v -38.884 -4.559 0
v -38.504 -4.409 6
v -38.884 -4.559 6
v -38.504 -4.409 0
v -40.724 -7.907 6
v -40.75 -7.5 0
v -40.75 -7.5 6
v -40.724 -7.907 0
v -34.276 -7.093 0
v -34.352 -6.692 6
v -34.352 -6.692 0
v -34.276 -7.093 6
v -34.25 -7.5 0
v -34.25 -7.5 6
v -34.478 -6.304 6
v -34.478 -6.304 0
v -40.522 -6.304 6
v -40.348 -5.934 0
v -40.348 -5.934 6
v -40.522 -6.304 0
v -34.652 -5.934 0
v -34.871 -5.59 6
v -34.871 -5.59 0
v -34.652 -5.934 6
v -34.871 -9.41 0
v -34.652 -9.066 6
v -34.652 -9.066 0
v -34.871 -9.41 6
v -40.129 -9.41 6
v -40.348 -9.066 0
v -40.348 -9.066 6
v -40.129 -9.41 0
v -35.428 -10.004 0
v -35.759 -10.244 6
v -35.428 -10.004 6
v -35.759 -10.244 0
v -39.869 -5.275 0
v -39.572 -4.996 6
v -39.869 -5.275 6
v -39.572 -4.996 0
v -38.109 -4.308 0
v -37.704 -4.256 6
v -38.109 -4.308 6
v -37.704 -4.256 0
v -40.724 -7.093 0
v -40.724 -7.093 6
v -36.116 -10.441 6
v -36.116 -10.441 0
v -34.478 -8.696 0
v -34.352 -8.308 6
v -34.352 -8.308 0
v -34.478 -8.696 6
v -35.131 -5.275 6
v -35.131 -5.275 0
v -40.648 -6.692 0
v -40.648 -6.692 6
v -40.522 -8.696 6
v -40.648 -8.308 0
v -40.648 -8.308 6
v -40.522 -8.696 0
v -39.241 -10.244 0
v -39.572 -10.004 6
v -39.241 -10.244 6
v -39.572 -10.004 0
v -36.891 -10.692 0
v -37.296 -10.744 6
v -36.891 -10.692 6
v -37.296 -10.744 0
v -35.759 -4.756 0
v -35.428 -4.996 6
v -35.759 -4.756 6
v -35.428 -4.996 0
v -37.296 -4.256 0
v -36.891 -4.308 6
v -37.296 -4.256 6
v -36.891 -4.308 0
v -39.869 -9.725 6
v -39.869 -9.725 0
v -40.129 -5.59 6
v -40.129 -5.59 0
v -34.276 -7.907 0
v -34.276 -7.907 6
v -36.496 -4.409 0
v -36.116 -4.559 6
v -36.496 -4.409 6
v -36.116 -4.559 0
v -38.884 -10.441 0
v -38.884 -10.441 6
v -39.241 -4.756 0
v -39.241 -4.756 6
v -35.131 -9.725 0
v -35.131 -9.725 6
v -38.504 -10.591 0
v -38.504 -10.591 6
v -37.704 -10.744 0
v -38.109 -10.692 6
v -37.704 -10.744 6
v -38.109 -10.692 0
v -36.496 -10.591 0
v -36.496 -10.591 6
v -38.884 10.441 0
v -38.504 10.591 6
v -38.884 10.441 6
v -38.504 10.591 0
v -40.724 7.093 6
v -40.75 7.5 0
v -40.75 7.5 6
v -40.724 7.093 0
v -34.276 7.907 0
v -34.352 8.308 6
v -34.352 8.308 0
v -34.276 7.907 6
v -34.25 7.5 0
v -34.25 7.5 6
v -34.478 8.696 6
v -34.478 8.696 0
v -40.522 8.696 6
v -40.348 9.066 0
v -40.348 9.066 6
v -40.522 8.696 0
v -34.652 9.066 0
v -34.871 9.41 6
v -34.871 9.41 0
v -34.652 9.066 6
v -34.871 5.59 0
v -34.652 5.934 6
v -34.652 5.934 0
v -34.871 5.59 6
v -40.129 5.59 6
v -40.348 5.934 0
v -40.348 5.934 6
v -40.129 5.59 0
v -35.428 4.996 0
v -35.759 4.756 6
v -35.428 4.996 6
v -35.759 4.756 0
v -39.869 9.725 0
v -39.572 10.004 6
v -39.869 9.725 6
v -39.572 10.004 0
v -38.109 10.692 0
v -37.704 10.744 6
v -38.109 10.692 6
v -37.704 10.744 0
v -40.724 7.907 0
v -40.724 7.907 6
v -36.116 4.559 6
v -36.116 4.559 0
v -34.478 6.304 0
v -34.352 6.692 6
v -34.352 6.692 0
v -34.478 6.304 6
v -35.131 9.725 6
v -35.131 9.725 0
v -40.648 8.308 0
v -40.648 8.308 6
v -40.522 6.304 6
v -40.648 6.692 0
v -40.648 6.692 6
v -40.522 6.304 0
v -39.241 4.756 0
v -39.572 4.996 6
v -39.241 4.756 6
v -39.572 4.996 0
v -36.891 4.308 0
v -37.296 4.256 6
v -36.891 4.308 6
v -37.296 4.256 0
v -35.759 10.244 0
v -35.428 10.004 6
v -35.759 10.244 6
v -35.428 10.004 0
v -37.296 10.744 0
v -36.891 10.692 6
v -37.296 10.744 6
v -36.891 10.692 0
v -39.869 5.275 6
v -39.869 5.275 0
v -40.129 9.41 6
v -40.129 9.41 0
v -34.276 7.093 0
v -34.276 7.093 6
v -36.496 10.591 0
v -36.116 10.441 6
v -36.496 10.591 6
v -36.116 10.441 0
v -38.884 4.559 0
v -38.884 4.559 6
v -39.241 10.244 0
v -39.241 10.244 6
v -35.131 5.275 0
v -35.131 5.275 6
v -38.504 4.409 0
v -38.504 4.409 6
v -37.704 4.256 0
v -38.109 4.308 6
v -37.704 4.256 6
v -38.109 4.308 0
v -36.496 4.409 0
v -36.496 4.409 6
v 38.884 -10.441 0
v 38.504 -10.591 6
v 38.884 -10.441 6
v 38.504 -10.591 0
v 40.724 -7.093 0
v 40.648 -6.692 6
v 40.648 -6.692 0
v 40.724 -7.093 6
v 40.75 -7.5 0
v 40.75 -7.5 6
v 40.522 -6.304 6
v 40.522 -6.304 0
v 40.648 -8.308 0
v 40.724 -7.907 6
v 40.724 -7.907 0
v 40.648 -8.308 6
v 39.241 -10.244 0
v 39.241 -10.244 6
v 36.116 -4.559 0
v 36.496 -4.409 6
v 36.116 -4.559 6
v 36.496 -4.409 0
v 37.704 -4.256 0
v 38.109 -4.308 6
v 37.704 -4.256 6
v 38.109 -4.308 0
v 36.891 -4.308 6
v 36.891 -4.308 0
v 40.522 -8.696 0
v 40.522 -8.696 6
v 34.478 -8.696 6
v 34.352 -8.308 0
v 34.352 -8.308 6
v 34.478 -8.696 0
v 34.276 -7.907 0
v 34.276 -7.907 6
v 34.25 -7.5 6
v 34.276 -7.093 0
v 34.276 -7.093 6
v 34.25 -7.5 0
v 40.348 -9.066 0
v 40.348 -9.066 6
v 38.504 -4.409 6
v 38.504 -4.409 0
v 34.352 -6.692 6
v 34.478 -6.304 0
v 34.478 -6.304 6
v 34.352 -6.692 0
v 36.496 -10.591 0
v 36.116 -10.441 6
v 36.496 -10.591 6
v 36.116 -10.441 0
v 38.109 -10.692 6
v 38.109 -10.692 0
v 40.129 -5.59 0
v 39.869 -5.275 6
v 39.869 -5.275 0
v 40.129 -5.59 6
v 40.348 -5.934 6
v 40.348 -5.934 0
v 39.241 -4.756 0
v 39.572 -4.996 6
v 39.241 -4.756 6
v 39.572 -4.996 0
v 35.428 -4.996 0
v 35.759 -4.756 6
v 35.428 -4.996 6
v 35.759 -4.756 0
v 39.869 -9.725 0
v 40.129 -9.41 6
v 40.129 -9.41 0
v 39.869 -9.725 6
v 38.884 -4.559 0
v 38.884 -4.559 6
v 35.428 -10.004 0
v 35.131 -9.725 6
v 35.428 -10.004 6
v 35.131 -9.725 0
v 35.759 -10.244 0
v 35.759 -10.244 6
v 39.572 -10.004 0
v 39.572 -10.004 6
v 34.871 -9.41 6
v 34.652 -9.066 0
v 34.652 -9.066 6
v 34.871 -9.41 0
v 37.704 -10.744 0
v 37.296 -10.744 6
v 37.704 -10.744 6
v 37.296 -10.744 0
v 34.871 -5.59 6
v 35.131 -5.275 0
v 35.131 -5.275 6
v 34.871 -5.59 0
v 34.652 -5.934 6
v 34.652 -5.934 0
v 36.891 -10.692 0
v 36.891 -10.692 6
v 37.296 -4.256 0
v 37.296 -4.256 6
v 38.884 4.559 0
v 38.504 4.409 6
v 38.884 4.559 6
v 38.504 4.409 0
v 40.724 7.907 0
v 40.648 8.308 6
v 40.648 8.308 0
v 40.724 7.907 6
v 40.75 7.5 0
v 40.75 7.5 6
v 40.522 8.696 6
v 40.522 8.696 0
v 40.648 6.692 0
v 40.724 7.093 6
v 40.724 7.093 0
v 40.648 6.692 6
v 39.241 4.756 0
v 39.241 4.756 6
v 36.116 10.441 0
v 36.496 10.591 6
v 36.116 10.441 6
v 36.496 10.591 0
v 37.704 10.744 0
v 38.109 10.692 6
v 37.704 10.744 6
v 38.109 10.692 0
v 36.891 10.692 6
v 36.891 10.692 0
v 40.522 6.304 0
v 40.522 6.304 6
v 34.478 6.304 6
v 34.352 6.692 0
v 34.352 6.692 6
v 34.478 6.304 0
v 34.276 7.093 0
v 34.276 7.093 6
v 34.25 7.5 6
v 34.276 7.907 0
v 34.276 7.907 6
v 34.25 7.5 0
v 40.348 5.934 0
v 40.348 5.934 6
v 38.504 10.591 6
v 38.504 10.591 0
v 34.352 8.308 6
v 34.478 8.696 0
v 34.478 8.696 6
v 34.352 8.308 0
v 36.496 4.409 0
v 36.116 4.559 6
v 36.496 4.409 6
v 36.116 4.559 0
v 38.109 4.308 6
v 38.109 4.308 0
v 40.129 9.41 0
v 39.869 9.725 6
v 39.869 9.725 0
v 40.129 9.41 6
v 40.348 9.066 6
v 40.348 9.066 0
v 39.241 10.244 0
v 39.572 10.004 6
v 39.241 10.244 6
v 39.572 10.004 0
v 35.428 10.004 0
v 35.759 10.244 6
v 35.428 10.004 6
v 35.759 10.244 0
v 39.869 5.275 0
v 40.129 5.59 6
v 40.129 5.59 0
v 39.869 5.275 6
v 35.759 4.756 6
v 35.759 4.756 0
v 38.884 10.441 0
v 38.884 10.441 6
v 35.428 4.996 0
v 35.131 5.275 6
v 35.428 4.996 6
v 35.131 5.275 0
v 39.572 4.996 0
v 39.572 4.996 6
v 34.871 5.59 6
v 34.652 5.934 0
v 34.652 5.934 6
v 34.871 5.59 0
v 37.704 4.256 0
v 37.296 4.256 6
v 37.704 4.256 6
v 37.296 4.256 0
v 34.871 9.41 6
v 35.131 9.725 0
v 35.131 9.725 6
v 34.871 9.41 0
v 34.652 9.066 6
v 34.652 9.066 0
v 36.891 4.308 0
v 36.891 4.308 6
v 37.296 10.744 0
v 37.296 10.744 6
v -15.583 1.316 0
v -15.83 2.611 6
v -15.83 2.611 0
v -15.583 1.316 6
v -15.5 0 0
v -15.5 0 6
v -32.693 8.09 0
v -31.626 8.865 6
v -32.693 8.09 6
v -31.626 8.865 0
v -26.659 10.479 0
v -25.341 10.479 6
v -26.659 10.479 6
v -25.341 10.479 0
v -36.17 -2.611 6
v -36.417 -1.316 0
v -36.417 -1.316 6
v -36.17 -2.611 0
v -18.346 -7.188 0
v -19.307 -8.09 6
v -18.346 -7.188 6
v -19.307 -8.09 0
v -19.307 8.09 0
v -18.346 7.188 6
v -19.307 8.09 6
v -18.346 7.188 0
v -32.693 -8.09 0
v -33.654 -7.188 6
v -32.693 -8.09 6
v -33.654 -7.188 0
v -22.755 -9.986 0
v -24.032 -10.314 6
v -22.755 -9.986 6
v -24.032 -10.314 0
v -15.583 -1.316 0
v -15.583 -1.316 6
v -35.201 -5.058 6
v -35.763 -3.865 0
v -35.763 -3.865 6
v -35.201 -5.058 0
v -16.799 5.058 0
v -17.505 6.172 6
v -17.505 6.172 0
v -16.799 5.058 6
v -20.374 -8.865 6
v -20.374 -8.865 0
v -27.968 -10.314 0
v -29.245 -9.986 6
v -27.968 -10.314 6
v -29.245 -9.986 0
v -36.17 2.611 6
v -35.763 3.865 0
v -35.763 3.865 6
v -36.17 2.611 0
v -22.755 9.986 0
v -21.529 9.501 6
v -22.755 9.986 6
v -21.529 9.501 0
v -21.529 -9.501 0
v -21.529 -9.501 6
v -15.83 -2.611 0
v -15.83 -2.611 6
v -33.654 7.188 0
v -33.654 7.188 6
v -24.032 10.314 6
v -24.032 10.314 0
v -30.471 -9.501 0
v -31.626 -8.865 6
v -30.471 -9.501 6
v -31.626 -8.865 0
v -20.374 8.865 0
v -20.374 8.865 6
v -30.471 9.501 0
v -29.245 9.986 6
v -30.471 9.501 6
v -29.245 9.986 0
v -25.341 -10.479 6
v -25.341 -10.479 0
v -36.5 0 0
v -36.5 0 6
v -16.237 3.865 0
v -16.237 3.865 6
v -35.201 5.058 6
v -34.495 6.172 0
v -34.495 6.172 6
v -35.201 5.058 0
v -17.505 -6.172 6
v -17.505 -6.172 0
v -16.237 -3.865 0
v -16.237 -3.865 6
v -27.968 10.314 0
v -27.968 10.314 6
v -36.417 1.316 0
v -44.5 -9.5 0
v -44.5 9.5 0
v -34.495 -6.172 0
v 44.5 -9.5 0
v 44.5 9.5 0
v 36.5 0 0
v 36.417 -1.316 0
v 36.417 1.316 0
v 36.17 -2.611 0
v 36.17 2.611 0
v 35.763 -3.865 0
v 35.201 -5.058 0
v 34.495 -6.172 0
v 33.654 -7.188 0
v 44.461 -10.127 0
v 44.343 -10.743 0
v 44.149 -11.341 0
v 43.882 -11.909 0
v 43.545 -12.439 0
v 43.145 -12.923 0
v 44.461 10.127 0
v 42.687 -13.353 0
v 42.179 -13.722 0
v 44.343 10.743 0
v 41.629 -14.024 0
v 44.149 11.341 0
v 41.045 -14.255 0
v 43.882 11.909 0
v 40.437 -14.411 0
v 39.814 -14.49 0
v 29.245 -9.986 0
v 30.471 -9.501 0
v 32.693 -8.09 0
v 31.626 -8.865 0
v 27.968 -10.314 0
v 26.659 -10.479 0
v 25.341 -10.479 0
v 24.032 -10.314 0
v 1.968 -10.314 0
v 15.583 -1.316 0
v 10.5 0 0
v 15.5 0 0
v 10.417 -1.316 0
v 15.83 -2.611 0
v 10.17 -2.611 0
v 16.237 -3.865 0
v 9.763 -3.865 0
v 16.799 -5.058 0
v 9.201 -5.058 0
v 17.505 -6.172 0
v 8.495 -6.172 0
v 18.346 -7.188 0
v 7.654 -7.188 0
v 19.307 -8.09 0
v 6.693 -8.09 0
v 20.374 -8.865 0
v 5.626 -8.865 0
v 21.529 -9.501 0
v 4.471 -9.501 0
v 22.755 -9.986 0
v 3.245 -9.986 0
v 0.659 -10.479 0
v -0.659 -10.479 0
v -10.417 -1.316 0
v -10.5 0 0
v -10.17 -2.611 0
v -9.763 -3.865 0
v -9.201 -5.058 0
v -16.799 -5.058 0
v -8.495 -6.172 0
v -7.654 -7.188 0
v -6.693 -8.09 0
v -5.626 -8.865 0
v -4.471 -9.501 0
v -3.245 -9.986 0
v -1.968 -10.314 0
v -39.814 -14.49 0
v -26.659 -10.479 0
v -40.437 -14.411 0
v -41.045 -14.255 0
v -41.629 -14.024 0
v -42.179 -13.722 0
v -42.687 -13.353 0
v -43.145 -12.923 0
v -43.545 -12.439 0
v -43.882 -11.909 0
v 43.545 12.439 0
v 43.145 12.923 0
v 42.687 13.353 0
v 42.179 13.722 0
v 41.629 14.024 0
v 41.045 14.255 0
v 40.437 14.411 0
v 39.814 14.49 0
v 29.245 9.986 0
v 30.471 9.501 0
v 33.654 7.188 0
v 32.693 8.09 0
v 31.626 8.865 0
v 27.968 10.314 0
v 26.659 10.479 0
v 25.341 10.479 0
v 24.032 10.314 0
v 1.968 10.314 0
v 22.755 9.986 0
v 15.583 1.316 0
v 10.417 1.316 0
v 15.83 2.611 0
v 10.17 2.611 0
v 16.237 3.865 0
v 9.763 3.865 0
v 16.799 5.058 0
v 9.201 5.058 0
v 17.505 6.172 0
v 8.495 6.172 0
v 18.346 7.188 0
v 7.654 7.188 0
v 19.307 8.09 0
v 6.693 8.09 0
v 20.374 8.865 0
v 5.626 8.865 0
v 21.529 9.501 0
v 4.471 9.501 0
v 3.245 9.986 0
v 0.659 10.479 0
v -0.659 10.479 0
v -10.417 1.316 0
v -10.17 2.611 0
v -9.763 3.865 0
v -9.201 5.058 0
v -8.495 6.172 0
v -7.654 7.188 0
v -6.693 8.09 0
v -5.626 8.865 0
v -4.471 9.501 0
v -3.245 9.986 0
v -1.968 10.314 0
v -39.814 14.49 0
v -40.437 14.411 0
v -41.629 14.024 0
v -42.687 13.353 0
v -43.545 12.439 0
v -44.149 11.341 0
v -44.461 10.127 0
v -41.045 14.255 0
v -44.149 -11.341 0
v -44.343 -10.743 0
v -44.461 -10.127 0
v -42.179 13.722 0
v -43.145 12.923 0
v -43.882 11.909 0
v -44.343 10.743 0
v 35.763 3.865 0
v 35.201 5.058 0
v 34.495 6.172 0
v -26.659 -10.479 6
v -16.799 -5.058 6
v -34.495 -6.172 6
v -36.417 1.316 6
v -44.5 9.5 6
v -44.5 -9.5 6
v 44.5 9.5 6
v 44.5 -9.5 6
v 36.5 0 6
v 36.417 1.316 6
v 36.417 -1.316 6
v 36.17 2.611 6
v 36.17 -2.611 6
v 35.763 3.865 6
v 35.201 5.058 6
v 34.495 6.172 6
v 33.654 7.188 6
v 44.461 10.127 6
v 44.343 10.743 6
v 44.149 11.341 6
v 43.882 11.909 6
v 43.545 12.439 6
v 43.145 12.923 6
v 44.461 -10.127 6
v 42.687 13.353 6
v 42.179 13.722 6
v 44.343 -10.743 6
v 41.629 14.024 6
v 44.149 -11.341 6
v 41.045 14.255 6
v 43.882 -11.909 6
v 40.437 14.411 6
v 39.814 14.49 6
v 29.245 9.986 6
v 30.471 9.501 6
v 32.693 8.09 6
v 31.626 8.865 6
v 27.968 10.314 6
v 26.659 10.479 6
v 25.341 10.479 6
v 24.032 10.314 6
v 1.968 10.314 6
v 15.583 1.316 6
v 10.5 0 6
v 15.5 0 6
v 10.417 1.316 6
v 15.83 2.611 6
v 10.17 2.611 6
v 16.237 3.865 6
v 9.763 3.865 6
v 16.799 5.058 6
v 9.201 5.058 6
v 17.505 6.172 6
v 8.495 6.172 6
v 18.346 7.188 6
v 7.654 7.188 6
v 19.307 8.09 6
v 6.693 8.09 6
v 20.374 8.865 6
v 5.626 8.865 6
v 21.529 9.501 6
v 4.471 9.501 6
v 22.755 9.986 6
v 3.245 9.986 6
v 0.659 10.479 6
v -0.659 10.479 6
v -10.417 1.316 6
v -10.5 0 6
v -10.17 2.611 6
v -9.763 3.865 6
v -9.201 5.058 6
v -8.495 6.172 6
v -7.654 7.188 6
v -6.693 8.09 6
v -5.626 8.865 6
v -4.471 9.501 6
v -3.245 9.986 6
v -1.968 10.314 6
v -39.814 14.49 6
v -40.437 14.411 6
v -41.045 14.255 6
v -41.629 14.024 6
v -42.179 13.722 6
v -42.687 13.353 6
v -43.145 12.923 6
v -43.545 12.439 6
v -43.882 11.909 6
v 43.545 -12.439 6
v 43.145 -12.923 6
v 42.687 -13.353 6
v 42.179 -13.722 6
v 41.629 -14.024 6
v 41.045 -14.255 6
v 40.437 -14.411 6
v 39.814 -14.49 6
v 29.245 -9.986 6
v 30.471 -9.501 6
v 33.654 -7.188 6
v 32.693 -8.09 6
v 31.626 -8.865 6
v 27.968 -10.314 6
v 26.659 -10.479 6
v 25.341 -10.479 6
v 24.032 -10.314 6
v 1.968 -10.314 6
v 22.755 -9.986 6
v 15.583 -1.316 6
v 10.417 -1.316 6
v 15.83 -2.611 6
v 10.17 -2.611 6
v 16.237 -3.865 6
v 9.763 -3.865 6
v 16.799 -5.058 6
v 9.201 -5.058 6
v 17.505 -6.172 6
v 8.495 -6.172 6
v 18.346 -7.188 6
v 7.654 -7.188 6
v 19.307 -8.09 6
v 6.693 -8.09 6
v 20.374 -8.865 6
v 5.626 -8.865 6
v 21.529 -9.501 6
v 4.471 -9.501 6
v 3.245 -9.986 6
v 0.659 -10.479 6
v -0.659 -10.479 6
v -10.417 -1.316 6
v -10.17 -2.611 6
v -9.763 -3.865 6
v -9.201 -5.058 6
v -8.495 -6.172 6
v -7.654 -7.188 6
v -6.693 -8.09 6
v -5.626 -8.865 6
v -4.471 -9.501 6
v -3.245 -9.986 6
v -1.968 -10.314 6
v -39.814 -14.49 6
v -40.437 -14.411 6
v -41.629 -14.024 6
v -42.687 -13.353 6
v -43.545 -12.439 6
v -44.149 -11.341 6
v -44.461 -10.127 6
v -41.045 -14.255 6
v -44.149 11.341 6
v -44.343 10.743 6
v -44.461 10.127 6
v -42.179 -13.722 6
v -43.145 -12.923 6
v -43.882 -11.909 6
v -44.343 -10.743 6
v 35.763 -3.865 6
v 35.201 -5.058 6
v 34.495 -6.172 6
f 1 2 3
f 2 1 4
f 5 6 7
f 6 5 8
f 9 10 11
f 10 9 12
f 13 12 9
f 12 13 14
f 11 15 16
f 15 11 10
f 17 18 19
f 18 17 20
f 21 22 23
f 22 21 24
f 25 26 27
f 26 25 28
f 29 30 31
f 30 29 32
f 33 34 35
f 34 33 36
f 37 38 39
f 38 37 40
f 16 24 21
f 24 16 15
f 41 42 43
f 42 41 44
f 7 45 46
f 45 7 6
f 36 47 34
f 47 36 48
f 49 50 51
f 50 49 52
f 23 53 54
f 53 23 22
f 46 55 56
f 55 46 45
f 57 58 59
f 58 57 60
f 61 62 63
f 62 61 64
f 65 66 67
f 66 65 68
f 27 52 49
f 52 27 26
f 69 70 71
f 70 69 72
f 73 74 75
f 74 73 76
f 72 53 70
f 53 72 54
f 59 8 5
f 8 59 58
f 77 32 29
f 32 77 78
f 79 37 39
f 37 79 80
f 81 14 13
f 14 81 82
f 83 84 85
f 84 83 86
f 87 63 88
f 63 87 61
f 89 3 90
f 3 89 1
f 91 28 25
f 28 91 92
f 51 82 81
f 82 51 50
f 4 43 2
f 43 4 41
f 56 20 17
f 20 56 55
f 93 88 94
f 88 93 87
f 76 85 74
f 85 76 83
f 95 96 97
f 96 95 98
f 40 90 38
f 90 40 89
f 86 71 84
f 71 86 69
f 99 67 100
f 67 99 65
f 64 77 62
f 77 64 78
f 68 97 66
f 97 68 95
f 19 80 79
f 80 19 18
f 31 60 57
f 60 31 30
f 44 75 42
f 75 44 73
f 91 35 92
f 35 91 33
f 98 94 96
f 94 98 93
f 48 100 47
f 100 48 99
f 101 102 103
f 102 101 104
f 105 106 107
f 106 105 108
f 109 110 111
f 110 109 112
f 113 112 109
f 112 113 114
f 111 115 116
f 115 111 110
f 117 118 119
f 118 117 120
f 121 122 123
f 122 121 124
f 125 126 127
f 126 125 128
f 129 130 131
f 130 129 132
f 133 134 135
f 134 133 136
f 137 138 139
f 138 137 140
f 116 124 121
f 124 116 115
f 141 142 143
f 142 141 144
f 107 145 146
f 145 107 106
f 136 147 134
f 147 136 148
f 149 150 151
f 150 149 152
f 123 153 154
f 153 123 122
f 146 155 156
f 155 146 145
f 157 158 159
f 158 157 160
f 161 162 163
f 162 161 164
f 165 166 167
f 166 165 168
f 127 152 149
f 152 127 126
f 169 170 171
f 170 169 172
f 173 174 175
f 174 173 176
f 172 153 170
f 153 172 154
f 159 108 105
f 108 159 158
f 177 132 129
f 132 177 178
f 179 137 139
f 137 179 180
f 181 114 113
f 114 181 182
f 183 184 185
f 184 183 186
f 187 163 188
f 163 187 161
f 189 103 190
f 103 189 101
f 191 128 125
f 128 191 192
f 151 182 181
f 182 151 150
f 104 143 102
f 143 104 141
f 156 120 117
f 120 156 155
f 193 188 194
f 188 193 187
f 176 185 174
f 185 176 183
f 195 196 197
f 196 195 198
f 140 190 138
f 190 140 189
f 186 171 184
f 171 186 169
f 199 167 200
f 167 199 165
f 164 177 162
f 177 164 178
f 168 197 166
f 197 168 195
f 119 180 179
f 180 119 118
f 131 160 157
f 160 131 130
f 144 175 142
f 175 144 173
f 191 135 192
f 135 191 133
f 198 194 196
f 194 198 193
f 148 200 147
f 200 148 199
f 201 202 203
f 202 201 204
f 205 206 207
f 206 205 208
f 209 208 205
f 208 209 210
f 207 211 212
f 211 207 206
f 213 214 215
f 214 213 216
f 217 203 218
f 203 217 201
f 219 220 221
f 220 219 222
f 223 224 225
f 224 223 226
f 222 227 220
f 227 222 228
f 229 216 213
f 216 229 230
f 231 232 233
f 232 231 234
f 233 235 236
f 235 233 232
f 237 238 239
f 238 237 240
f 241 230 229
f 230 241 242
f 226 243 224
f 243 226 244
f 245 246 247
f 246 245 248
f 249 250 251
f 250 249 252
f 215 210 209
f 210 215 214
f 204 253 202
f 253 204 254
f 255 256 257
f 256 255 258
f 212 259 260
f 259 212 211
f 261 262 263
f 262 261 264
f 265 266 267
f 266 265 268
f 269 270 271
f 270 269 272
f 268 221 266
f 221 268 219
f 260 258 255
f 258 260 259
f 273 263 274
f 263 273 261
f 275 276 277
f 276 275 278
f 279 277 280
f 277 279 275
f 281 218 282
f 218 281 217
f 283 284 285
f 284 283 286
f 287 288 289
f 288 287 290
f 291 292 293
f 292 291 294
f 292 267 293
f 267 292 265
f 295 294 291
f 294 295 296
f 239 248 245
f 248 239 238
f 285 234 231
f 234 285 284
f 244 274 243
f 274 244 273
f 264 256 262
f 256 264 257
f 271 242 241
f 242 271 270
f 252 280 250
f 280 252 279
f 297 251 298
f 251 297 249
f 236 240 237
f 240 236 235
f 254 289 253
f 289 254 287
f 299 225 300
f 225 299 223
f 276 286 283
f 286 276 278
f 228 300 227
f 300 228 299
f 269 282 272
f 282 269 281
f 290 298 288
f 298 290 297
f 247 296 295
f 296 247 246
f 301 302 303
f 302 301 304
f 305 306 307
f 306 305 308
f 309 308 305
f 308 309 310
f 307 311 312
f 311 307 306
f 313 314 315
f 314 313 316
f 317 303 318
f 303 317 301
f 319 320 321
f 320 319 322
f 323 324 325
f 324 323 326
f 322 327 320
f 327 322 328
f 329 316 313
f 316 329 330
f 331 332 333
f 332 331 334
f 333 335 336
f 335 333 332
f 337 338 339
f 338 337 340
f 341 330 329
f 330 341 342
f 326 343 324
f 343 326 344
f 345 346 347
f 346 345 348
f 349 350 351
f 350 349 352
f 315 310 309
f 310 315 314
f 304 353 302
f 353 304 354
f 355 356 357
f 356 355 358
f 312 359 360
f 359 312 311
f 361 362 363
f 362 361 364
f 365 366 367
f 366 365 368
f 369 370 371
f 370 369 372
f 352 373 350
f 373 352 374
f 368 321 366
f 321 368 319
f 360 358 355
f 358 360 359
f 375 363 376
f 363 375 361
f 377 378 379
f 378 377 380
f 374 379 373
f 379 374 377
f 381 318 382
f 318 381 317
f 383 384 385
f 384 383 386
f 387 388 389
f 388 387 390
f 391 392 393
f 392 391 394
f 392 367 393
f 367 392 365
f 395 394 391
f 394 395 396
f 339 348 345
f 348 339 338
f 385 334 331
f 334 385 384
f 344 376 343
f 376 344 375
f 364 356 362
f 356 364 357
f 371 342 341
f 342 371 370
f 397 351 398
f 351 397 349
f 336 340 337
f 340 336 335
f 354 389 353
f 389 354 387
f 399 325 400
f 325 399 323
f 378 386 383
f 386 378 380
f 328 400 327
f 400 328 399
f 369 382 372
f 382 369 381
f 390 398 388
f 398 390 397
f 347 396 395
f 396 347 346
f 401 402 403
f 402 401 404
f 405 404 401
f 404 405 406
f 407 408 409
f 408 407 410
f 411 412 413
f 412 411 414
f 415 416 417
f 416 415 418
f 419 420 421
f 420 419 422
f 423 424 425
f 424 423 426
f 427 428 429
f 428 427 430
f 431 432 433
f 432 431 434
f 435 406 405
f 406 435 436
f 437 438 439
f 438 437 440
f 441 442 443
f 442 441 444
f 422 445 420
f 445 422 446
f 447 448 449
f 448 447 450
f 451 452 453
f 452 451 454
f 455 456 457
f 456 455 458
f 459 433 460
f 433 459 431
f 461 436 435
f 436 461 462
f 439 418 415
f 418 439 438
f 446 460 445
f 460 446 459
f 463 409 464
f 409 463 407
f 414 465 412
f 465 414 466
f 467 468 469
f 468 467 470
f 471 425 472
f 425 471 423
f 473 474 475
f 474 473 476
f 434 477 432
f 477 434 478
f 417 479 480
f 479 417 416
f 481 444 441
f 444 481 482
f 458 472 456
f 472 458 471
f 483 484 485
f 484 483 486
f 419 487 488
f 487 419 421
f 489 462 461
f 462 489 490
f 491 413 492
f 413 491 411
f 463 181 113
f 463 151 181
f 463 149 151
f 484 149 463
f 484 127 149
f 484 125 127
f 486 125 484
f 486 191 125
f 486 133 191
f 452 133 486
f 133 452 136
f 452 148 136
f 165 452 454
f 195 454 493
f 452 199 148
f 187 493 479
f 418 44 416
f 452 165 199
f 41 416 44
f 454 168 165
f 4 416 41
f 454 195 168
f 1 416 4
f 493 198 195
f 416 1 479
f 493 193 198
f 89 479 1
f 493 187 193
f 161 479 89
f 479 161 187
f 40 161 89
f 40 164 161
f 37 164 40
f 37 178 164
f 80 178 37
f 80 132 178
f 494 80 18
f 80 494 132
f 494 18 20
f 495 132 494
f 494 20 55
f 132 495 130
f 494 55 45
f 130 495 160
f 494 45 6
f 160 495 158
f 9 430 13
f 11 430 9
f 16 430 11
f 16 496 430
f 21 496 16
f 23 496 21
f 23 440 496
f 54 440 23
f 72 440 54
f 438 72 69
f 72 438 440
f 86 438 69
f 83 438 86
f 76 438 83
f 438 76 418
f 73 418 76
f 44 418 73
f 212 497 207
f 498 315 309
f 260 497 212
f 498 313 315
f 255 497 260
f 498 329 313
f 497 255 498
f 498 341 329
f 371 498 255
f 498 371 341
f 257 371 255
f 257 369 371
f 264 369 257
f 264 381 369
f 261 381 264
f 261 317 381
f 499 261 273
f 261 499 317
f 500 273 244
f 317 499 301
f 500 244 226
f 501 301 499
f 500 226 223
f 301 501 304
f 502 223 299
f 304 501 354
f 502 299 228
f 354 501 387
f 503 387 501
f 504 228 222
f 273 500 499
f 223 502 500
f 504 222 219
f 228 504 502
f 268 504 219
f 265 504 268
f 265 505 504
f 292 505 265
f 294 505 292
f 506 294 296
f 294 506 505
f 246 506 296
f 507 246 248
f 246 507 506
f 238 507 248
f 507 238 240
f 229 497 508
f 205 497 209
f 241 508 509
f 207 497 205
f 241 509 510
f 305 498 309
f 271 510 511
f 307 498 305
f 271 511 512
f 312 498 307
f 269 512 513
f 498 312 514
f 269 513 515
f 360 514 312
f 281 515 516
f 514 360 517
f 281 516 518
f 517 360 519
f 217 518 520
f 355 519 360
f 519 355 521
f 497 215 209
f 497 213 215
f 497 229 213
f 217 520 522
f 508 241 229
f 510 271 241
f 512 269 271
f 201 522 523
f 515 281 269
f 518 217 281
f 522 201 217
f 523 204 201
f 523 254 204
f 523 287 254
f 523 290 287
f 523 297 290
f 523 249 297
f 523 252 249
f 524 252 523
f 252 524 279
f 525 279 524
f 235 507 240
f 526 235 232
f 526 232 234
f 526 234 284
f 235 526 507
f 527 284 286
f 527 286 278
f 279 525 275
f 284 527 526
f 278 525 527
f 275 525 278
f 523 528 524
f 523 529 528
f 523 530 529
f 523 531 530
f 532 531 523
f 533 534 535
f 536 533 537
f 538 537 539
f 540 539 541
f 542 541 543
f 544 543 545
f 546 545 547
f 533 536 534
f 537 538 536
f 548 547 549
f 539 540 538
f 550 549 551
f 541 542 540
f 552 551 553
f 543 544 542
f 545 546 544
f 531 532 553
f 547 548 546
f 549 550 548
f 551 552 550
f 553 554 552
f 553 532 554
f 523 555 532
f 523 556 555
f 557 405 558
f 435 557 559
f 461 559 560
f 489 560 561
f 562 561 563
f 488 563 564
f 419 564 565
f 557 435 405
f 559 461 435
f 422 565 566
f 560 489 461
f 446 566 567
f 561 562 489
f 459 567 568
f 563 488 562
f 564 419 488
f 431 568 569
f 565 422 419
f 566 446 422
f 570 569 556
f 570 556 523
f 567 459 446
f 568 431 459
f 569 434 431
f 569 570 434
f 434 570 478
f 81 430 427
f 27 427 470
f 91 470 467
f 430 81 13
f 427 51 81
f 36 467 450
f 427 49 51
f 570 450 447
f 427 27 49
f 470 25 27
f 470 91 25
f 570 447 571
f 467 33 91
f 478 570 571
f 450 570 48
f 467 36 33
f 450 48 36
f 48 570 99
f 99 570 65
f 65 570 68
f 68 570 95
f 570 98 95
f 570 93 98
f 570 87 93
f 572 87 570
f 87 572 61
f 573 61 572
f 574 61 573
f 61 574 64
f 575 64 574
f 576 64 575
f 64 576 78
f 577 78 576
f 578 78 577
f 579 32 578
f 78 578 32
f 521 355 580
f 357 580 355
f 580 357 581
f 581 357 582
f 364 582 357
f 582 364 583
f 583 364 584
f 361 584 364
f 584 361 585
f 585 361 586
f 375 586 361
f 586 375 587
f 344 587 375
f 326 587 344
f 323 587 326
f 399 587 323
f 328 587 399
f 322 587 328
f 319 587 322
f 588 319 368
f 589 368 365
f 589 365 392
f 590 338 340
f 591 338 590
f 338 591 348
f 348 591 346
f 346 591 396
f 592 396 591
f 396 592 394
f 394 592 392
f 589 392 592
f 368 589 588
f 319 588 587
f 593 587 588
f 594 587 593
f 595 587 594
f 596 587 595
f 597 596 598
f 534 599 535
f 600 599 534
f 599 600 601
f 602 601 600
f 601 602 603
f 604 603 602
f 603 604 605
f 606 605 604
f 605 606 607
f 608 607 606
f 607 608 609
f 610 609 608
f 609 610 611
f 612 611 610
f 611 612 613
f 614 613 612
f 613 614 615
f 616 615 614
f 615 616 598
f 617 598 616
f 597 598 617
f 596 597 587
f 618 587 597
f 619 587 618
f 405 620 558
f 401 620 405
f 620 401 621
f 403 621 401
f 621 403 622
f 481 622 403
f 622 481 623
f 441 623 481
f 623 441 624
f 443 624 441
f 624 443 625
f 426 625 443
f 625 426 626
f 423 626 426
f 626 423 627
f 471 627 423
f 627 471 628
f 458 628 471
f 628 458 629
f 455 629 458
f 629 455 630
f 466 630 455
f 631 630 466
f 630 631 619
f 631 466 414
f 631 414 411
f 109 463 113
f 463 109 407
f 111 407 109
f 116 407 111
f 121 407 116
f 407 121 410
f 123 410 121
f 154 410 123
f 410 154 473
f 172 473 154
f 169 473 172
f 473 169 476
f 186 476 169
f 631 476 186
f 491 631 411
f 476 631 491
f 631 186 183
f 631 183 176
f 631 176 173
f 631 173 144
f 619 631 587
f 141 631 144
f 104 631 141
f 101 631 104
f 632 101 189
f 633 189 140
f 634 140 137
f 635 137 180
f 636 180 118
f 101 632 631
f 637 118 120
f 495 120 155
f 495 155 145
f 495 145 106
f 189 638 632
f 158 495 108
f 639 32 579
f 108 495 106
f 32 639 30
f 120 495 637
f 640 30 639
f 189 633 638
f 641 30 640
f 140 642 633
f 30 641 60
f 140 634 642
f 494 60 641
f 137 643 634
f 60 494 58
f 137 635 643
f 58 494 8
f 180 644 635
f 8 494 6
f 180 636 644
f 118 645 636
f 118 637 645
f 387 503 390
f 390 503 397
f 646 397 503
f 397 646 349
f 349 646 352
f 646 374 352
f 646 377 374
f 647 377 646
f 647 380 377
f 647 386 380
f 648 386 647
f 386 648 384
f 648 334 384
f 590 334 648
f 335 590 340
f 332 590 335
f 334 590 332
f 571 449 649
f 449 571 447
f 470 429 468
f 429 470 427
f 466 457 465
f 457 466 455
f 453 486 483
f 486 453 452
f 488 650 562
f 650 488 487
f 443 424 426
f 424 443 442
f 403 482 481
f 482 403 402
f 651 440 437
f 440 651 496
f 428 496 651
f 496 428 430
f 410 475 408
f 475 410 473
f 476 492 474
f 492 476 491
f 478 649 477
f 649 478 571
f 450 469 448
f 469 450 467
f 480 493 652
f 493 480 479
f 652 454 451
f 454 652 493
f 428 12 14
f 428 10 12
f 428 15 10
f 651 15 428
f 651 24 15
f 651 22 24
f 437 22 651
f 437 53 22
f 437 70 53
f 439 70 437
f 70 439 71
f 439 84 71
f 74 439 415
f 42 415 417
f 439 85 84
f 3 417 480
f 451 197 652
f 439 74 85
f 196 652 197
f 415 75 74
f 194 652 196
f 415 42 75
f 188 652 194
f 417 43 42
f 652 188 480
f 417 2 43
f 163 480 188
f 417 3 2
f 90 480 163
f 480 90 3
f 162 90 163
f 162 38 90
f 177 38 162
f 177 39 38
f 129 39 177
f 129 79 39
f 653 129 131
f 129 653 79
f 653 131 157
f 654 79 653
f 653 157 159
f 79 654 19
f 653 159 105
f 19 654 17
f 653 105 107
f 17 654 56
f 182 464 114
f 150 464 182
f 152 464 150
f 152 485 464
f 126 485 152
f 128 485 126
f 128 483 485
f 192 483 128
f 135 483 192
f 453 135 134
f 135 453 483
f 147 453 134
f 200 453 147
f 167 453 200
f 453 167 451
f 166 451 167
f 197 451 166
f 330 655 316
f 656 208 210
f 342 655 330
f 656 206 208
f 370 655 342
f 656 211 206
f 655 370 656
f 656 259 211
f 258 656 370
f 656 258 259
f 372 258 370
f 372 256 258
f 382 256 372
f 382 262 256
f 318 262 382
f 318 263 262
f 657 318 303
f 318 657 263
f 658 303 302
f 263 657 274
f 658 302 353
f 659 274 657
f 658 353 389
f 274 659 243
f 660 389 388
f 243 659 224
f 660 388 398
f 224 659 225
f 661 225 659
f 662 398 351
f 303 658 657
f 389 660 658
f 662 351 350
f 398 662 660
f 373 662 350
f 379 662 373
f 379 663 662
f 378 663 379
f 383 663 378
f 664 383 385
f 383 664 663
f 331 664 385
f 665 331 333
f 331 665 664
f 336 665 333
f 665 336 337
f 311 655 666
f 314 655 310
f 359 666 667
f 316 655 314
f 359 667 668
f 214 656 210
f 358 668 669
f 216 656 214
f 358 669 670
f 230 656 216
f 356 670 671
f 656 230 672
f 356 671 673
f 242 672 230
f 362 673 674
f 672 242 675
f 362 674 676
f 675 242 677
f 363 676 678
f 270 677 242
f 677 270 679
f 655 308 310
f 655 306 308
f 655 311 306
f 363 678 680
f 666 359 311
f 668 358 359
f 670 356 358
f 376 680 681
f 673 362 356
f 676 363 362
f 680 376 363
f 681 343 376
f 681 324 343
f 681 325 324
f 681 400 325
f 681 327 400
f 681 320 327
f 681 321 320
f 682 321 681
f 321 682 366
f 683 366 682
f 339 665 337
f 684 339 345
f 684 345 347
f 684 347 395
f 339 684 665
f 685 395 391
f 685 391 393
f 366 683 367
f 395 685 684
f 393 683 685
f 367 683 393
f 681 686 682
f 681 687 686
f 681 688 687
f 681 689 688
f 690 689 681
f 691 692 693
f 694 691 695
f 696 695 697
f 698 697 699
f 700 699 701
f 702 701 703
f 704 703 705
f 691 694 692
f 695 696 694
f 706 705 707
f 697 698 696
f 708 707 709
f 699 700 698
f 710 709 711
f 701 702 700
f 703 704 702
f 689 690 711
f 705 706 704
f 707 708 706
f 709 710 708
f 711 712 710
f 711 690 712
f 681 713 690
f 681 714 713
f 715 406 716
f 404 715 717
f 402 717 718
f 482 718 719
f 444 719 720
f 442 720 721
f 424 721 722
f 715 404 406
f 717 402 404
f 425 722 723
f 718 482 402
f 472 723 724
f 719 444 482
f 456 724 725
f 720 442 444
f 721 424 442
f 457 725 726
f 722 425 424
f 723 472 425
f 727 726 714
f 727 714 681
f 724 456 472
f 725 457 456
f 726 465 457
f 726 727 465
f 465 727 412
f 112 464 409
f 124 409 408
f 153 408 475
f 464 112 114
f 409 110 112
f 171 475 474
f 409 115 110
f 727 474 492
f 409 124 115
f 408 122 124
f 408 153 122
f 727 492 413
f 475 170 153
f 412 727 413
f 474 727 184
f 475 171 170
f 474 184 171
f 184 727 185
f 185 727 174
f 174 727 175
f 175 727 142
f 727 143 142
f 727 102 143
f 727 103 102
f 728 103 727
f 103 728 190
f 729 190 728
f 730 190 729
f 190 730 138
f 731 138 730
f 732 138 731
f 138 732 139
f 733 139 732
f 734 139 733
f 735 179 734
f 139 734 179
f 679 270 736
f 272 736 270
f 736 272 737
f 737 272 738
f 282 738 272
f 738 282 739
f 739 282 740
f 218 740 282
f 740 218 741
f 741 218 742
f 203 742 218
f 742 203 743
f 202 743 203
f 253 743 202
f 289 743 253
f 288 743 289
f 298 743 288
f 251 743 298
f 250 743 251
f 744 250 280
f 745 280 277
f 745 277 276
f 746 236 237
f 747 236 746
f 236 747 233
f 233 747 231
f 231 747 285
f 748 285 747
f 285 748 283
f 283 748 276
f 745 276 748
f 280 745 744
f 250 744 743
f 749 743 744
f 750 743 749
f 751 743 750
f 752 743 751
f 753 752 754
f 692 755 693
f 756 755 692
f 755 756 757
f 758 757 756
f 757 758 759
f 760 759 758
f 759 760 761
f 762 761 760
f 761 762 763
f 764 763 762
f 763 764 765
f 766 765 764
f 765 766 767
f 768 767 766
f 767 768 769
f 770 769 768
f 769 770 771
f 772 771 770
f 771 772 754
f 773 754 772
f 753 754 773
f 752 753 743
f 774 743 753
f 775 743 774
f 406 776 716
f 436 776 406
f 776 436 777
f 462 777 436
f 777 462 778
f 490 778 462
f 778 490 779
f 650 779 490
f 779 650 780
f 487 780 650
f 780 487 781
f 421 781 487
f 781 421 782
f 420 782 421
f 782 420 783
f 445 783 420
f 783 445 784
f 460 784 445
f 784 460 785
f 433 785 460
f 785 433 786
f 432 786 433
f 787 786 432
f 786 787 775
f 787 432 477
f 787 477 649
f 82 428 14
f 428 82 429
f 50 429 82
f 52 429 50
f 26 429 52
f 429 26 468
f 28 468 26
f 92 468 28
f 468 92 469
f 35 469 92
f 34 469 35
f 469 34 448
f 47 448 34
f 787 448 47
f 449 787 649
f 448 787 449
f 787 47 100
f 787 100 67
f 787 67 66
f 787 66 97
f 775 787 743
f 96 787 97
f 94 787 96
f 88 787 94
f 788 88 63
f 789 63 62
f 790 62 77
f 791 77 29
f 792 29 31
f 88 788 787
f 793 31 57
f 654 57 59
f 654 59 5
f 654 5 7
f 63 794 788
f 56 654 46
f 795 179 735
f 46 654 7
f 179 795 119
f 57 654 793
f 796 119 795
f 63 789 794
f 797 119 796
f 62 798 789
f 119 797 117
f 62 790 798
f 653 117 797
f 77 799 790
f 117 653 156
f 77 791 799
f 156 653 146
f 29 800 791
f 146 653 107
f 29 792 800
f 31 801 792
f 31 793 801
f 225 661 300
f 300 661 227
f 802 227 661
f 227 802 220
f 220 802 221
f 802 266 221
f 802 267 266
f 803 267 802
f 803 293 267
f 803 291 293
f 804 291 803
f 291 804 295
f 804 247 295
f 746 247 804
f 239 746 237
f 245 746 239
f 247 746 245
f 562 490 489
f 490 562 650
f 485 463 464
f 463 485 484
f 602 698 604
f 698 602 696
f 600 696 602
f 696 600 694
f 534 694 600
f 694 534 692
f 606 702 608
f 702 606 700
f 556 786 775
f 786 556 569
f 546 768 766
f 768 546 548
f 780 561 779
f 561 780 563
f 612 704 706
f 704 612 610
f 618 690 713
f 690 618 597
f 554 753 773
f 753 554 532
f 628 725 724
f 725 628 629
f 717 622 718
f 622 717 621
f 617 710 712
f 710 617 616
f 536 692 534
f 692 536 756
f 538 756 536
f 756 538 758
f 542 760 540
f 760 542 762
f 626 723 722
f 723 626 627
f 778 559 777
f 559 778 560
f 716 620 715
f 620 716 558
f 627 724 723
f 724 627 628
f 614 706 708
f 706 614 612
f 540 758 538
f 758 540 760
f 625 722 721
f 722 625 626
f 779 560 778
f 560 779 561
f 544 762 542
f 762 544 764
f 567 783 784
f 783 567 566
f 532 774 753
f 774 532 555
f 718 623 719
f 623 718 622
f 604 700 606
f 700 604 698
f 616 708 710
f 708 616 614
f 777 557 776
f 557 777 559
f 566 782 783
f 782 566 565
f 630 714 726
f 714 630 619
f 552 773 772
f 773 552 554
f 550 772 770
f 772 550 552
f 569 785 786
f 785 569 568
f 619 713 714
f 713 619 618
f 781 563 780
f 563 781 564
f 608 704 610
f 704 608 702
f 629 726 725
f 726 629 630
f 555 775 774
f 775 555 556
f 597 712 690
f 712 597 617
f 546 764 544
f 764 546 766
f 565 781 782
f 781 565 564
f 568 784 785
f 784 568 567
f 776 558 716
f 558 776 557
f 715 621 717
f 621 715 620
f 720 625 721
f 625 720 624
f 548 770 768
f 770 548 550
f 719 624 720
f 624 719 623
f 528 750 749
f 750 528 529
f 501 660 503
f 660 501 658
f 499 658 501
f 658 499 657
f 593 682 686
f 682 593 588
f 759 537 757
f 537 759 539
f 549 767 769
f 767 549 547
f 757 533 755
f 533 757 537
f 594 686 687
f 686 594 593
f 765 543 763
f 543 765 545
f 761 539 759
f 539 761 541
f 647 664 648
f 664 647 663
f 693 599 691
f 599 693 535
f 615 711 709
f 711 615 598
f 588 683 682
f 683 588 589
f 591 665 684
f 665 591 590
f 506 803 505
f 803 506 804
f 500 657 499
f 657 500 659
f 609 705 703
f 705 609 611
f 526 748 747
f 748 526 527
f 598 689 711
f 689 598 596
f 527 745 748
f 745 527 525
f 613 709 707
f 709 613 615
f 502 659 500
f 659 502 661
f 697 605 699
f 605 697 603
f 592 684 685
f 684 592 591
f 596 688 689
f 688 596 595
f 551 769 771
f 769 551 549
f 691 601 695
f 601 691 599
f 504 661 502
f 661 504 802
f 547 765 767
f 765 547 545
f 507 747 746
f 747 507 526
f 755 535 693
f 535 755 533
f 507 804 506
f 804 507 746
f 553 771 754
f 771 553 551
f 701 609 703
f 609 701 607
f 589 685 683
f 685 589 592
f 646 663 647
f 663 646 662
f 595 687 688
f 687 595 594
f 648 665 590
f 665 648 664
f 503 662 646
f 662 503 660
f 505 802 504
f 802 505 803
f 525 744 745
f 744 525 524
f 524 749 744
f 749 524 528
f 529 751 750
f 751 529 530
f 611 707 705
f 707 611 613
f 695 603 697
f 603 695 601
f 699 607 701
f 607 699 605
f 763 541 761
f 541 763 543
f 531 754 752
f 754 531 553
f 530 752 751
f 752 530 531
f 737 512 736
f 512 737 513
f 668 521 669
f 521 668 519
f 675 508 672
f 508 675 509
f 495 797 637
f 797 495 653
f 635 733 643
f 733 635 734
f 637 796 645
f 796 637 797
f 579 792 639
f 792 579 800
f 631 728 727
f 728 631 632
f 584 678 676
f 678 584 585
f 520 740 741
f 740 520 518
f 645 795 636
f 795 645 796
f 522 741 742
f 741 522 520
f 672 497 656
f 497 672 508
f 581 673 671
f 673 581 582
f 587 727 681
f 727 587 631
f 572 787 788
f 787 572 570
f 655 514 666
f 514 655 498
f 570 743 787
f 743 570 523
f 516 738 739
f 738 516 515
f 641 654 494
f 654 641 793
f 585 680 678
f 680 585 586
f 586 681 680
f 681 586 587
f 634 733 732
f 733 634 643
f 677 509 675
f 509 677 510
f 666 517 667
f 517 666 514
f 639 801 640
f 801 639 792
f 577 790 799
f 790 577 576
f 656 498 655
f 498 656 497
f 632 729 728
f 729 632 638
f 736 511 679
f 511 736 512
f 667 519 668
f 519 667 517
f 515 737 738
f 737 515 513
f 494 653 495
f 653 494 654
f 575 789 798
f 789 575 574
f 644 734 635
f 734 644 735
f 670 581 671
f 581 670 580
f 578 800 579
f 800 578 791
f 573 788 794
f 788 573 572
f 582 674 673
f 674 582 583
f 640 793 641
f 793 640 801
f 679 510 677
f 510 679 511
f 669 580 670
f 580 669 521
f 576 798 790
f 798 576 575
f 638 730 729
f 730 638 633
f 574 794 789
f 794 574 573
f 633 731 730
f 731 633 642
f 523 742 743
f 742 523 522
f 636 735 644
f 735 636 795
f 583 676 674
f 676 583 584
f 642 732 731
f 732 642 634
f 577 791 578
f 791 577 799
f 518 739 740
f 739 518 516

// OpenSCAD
$fn = 50;

difference() {
	union() {
		hull() {
			translate(v = [-39.5, 9.5, 0]) {
				cylinder(h = 6, r = 5);
			}
			translate(v = [39.5, 9.5, 0]) {
				cylinder(h = 6, r = 5);
			}
			translate(v = [-39.5, -9.5, 0]) {
				cylinder(h = 6, r = 5);
			}
			translate(v = [39.5, -9.5, 0]) {
				cylinder(h = 6, r = 5);
			}
		}
	}
	union() {
		translate(v = [-37.5, -7.5, -100.0]) {
			cylinder(h = 200, r = 3.25);
		}
		translate(v = [-37.5, 7.5, -100.0]) {
			cylinder(h = 200, r = 3.25);
		}
		translate(v = [37.5, -7.5, -100.0]) {
			cylinder(h = 200, r = 3.25);
		}
		translate(v = [37.5, 7.5, -100.0]) {
			cylinder(h = 200, r = 3.25);
		}
		translate(v = [-37.5, -7.5, -100.0]) {
			cylinder(h = 200, r = 1.8);
		}
		translate(v = [-37.5, 7.5, -100.0]) {
			cylinder(h = 200, r = 1.8);
		}
		translate(v = [37.5, -7.5, -100.0]) {
			cylinder(h = 200, r = 1.8);
		}
		translate(v = [37.5, 7.5, -100.0]) {
			cylinder(h = 200, r = 1.8);
		}
		translate(v = [-26.0, 0, 0.0]) {
			cylinder(h = 6, r = 10.5);
		}
		cylinder(h = 6, r = 10.5);
		translate(v = [26.0, 0, 0.0]) {
			cylinder(h = 6, r = 10.5);
		}
	}
}
